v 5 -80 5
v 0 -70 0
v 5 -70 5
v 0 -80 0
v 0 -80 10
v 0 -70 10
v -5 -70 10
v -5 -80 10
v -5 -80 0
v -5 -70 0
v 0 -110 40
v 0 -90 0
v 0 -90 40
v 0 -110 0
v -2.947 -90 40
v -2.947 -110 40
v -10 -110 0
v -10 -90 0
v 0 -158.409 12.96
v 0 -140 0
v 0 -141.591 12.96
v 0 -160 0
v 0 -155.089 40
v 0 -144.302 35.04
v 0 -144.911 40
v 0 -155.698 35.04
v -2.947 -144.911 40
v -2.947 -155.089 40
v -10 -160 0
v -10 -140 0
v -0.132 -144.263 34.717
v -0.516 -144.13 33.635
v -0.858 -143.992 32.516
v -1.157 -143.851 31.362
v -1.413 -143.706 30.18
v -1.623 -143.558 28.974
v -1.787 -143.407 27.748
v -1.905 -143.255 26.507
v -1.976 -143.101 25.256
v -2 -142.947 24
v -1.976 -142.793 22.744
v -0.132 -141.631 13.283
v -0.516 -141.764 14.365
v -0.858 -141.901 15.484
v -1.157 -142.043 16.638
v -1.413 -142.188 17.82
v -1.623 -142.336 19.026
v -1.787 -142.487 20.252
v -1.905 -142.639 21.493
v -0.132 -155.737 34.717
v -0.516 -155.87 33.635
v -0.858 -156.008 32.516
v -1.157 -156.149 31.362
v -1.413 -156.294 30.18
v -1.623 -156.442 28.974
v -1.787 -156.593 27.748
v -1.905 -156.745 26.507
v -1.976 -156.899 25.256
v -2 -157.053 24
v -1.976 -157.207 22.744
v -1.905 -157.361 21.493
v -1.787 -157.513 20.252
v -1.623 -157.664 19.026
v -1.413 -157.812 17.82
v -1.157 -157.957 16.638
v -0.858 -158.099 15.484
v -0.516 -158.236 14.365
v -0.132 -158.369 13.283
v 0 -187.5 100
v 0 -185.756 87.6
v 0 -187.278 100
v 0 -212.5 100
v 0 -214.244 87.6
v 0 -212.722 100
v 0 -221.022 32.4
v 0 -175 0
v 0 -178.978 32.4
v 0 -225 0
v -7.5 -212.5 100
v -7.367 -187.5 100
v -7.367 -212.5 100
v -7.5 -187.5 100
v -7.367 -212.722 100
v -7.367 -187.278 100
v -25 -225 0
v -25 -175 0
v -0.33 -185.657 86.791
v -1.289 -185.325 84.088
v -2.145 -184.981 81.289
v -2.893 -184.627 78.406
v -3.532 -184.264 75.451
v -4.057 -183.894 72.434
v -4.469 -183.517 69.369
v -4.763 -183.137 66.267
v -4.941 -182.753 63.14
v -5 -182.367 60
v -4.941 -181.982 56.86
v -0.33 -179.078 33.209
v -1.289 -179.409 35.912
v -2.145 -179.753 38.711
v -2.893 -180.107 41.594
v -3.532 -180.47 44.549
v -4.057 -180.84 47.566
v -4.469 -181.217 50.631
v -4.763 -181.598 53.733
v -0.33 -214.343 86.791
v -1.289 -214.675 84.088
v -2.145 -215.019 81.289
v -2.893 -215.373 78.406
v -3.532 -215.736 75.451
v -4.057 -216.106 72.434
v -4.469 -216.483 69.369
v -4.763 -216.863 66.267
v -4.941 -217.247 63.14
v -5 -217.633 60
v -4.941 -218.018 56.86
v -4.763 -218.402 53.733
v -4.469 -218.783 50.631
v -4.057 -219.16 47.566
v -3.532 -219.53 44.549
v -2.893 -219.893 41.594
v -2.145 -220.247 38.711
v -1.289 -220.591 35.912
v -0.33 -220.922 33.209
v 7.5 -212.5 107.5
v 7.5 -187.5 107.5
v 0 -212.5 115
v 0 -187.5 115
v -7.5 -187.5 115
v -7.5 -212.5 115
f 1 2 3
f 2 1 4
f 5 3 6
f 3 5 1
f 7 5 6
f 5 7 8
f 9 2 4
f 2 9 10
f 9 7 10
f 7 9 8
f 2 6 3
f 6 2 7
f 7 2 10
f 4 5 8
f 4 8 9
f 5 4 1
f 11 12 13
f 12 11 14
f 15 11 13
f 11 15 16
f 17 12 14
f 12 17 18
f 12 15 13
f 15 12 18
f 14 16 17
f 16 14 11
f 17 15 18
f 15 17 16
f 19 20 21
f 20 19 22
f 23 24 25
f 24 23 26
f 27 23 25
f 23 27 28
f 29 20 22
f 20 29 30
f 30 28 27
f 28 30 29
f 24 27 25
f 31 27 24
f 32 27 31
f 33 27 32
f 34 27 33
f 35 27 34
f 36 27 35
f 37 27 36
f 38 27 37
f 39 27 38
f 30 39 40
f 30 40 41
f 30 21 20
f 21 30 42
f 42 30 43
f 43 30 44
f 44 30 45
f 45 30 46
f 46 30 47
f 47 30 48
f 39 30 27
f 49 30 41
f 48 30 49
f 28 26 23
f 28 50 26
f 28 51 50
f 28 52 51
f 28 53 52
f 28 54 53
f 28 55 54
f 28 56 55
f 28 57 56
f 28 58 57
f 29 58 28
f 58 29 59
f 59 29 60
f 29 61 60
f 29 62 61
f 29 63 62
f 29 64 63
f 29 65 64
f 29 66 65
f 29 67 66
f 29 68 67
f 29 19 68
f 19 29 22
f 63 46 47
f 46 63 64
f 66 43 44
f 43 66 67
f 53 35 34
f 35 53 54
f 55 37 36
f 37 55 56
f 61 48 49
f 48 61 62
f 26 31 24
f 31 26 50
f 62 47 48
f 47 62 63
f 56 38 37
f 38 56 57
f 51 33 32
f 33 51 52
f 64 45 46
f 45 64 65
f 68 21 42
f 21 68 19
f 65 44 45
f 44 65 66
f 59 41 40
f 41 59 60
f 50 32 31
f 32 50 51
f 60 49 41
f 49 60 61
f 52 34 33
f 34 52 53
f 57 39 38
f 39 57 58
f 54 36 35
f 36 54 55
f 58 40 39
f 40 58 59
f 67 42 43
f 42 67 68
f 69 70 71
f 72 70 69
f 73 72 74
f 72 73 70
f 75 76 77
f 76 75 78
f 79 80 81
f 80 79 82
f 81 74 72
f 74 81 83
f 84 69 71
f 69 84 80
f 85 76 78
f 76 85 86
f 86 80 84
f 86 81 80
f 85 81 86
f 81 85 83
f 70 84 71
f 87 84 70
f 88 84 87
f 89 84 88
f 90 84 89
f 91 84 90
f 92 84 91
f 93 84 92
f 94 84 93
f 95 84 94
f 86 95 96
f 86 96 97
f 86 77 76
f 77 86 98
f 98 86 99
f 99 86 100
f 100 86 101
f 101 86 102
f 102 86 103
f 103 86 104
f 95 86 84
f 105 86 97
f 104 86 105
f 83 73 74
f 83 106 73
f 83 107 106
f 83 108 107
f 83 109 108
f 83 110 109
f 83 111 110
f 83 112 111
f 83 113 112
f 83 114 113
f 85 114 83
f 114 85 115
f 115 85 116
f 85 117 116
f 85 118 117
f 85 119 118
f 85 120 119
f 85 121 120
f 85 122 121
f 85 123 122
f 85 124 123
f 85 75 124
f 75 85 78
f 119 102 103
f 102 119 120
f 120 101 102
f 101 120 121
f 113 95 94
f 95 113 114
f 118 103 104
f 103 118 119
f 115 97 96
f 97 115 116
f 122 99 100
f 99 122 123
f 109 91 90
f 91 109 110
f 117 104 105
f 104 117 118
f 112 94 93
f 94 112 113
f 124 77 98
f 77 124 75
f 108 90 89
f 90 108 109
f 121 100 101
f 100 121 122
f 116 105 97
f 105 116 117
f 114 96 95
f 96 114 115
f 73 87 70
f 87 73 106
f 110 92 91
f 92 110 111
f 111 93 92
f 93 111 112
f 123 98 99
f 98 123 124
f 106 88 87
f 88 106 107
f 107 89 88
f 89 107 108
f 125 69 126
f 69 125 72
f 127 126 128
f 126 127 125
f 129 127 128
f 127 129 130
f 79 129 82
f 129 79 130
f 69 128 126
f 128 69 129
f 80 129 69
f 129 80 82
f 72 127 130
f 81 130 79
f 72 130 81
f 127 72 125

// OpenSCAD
// file: cantilever-snap.scad
/* make a cantilever snap arm.  This is not super robust.
 * The best way to use this is to only use snap_arm(scale_factor = xxx)
 */

$fn=100;

module cantilever_snap_head(width, depth)
{
	height = width;

	difference() {
		translate(v = [-0.5 * width, -0.5 * depth, 0])
			cube(size = [width, depth, height]);
		translate(v = [0, -0.5 * depth - 1, 0]) {
			rotate(v = [0, 1, 0], a = 45)
				cube(size = [width, 2 * depth, height]);
			translate(v = [width / 2, -1, 0.5 * height])
				rotate(v = [0, 1, 0], a = -45)
					cube(size = [width, 2 * depth, height]);
		}
	}
}

module cantilever_snap_arm_base(base_width, depth, height)
{
	difference() {
		translate(v = [-base_width, -0.5 * depth, 0])
			cube(size = [base_width, depth, height]);
		translate(v = [-base_width, -0.5 * depth, 0])
			rotate(v = [0, 1, 0], a = 10)
				translate(v = [-2 * base_width, -0.5 * depth, 0])
					cube(size = [2 * base_width, 2 * depth, 2 * height]);
	}
}

module tapered_cantilever_snap_arm_base(base_width, depth, height)
{

	difference() {
		cantilever_snap_arm_base(base_width, depth, height);
		translate(v = [0, 0.5 * depth, 0])
			rotate(v = [1, 0, 0], a = 7)
				translate(v = [-1.5 * base_width, 0, 0])
					cube(size = [2 * base_width, depth, 2 * height]);
		translate(v = [-1.5 * base_width, -0.5 * depth, 0])
			rotate(v = [1, 0, 0], a = -7)
				translate(v = [0, -depth, 0])
					cube(size = [2 * base_width, depth, 2 * height]);
		translate(v = [1.0 * base_width, depth, 0.6 * height])
			rotate(v = [1, 0, 0], a = 90)
				scale(v = [0.6, 1.0, 1.0])
					cylinder(r1 = 0.5 * height, r2 = 0.5 * height, h = 2 * depth);
	}
}

module snap_arm(scale_factor)
{
	scale(v = [0.01 * scale_factor, 0.01 * scale_factor, 0.01 * scale_factor]) {
		union() {
			tapered_cantilever_snap_arm_base(25, 50, 100);
			translate(v = [0, 0, 100])
				cantilever_snap_head(15, 25);
		}
	}
}
/*
module fader_snap_arm()
{
	snap_arm(11);
}

module fader_snap_arms(count)
{
	fader_snap_arm();
	translate(v = [88, 0, 0])
			rotate(v = [0, 0, 1], a = 180)
				fader_snap_arm();

	for (i = [1 : 1 : count]) {
		translate(v = [i * 88/(count + 1), -6, 0])
			rotate(v = [0, 0, 1], 90)
				fader_snap_arm();
		translate(v = [i * 88/(count + 1), 6, 0])
			rotate(v = [0, 0, 1], -90)
				fader_snap_arm();
	}
}

module tapered_snap_arm_row(ih, oh, w, back_angle, d, taper_angle, count, total_space)
{

	for (i = [1 : 1 : count]) {
		translate(v = [i * total_space / (count) , 0])
			rotate(v = [0, 0, 1], a = 90)
				tapered_cantilever_snap_arm(ih, oh, w, back_angle, d, taper_angle);
	}
}
*/

/* tapered_cantilever_snap_arm(8, 11, 1.2, 6, 10, 15); */
/* fader_snap_arms(3); */
/* tapered_snap_arm_row(3, 6.6, 1.2, 7, 10, 15, 6, 100); */
// main file
include <cantilever-snap.scad>

translate(v = [0, -75, 0])
	cantilever_snap_head(10, 10);

translate(v= [0, -100, 0])
	cantilever_snap_arm_base(10, 20, 40);

translate(v= [0, -150, 0])
	tapered_cantilever_snap_arm_base(10, 20, 40);

translate(v= [0, -200, 0])
	snap_arm(100);
